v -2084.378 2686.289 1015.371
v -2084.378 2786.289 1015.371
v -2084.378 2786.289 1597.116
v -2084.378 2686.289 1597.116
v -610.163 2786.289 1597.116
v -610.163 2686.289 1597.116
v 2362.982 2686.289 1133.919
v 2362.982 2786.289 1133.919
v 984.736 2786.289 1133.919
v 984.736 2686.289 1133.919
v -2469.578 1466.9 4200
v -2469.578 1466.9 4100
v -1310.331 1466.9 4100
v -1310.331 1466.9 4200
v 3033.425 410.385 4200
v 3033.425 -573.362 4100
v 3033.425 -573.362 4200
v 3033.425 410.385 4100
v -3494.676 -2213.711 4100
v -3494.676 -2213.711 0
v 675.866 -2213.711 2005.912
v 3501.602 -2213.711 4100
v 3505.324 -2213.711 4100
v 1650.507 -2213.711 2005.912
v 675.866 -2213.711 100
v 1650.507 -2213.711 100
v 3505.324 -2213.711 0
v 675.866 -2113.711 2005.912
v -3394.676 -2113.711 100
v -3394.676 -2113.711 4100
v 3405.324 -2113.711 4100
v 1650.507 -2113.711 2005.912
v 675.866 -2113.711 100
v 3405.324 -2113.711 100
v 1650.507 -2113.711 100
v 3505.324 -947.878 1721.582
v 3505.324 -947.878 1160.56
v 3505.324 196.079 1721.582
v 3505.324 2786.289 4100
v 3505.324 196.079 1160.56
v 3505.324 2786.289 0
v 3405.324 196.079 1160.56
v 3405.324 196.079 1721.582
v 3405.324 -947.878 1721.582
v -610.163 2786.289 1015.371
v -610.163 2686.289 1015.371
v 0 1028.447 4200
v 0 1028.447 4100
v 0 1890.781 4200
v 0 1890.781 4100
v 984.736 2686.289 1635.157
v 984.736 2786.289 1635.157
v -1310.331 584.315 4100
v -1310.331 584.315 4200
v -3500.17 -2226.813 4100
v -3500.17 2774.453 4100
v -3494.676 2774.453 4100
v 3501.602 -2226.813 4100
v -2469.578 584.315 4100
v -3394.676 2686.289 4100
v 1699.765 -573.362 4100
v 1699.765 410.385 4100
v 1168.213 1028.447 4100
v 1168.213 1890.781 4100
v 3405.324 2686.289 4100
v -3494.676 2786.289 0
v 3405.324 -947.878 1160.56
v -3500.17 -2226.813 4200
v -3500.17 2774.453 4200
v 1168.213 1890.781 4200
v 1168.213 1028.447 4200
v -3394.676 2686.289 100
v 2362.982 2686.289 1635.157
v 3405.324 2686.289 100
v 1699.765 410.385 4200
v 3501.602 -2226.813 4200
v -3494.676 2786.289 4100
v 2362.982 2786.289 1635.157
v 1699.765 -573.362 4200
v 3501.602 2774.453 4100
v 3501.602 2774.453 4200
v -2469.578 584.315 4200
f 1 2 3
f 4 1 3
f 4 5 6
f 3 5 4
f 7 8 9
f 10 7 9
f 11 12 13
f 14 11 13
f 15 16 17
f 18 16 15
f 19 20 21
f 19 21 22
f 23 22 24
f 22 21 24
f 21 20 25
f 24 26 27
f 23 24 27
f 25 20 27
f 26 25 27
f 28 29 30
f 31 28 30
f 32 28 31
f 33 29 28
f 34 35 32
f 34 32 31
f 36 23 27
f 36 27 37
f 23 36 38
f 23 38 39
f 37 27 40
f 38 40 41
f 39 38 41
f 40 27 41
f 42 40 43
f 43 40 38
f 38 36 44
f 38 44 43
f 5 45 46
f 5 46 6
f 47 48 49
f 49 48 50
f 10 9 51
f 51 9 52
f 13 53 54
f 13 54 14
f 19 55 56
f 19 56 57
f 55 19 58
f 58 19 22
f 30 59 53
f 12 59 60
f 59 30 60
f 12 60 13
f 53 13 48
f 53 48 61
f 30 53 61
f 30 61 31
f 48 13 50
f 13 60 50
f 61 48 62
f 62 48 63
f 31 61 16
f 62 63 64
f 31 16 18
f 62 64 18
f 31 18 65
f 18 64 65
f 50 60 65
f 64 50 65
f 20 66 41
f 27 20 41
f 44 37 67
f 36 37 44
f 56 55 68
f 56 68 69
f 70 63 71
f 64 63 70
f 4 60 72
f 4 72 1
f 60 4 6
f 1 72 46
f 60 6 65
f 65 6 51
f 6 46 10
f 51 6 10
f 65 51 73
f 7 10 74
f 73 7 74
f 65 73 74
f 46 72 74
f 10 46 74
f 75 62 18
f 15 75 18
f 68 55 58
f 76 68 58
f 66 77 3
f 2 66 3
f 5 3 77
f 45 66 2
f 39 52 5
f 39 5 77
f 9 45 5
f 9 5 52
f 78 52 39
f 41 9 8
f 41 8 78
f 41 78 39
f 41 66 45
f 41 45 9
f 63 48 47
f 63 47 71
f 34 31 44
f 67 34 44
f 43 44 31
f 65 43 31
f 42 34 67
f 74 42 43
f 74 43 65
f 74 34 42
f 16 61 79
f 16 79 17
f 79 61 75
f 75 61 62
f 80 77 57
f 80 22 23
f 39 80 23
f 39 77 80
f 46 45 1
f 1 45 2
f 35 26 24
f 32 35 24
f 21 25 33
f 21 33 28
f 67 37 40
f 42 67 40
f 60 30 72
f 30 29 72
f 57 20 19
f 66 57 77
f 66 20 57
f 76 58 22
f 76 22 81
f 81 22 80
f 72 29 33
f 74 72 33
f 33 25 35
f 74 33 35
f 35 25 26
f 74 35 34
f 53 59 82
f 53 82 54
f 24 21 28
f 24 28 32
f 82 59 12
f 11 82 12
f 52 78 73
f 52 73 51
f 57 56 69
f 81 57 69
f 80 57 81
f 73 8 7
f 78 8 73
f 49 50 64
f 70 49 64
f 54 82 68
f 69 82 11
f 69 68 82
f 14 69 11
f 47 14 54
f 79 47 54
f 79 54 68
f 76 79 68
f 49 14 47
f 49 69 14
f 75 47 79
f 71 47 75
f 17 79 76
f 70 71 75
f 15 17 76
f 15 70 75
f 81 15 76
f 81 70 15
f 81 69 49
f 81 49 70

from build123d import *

# Parameters (mm, degrees)
F0_W      = 7000
F0_H      = 5000
F1_DEPTH  = 4100
F2_T      = -100
F4_W      = 7001.7721652985
F4_H      = 5001.2657642365
F5_DEPTH  = 100
F6_W      = 1159.2469215393
F6_H      = 882.5842142105
F6_W_2    = 1168.2131290436
F6_H_2    = 862.3332977295
F6_W_3    = 1333.6598873138
F6_H_3    = 983.7473630905
F7_DEPTH  = 150
F8_W      = 1143.9567655325
F8_H      = 561.0218048096
F9_DEPTH  = 150
F10_W     = 1378.2457113266
F10_H     = 501.2377500534
F10_W_2   = 1474.2147922516
F10_H_2   = 581.7452669144
F11_DEPTH = 150
F12_W     = 974.6417999268
F12_H     = 1905.9120416641
F13_DEPTH = 150


with BuildPart() as f1:
    # F0 (on Top) → F1 (new body)
    with BuildSketch(Plane.XY):
        with Locations((5.3243301809, 286.2890493809)):
            Rectangle(F0_W, F0_H)
    extrude(amount=F1_DEPTH)

    # F2
    f2_openings = [f1.faces().sort_by_distance(p)[0] for p in [
        (5.32433, 286.289049, 4100),
    ]]
    offset(amount=F2_T, openings=f2_openings)

    # F4 (on 3pt) → F5 (join)
    with BuildSketch(Plane.XY.offset(4100)):
        with Locations((0.7160902023, 273.8202810287)):
            Rectangle(F4_W, F4_H)
    extrude(amount=F5_DEPTH)

    # F6 (on 3pt) → F7 (cut)
    with BuildSketch(Plane.XY.offset(4100)):
        with Locations((-1889.9548053741, 1025.607407093)):
            Rectangle(F6_W, F6_H)
        with Locations((584.1065645218, 1459.6139192581)):
            Rectangle(F6_W_2, F6_H_2)
        with Locations((2366.5949106216, -81.4886689186)):
            Rectangle(F6_W_3, F6_H_3)
    extrude(amount=F7_DEPTH, mode=Mode.SUBTRACT)

    # F8 (on face) → F9 (cut)
    with BuildSketch(Plane.YZ.offset(3505.3243301809)):
        with Locations((-375.899143517, 1441.0707950592)):
            Rectangle(F8_W, F8_H)
    extrude(amount=-F9_DEPTH, mode=Mode.SUBTRACT)

    # F10 (on face) → F11 (cut)
    with BuildSketch(Plane(origin=(0, 2786.2890493809, 0), x_dir=(-1, 0, 0), z_dir=(0, 1, 0))):
        with Locations((-1673.8589406013, 1384.5381140709)):
            Rectangle(F10_W, F10_H)
        with Locations((1347.2708463669, 1306.2437176704)):
            Rectangle(F10_W_2, F10_H_2)
    extrude(amount=-F11_DEPTH, mode=Mode.SUBTRACT)

    # F12 (on face) → F13 (cut)
    with BuildSketch(Plane.XZ.offset(2213.7109506191)):
        with Locations((1163.1864309311, 1052.9560208321)):
            Rectangle(F12_W, F12_H)
    extrude(amount=-F13_DEPTH, mode=Mode.SUBTRACT)


solid = f1.part
